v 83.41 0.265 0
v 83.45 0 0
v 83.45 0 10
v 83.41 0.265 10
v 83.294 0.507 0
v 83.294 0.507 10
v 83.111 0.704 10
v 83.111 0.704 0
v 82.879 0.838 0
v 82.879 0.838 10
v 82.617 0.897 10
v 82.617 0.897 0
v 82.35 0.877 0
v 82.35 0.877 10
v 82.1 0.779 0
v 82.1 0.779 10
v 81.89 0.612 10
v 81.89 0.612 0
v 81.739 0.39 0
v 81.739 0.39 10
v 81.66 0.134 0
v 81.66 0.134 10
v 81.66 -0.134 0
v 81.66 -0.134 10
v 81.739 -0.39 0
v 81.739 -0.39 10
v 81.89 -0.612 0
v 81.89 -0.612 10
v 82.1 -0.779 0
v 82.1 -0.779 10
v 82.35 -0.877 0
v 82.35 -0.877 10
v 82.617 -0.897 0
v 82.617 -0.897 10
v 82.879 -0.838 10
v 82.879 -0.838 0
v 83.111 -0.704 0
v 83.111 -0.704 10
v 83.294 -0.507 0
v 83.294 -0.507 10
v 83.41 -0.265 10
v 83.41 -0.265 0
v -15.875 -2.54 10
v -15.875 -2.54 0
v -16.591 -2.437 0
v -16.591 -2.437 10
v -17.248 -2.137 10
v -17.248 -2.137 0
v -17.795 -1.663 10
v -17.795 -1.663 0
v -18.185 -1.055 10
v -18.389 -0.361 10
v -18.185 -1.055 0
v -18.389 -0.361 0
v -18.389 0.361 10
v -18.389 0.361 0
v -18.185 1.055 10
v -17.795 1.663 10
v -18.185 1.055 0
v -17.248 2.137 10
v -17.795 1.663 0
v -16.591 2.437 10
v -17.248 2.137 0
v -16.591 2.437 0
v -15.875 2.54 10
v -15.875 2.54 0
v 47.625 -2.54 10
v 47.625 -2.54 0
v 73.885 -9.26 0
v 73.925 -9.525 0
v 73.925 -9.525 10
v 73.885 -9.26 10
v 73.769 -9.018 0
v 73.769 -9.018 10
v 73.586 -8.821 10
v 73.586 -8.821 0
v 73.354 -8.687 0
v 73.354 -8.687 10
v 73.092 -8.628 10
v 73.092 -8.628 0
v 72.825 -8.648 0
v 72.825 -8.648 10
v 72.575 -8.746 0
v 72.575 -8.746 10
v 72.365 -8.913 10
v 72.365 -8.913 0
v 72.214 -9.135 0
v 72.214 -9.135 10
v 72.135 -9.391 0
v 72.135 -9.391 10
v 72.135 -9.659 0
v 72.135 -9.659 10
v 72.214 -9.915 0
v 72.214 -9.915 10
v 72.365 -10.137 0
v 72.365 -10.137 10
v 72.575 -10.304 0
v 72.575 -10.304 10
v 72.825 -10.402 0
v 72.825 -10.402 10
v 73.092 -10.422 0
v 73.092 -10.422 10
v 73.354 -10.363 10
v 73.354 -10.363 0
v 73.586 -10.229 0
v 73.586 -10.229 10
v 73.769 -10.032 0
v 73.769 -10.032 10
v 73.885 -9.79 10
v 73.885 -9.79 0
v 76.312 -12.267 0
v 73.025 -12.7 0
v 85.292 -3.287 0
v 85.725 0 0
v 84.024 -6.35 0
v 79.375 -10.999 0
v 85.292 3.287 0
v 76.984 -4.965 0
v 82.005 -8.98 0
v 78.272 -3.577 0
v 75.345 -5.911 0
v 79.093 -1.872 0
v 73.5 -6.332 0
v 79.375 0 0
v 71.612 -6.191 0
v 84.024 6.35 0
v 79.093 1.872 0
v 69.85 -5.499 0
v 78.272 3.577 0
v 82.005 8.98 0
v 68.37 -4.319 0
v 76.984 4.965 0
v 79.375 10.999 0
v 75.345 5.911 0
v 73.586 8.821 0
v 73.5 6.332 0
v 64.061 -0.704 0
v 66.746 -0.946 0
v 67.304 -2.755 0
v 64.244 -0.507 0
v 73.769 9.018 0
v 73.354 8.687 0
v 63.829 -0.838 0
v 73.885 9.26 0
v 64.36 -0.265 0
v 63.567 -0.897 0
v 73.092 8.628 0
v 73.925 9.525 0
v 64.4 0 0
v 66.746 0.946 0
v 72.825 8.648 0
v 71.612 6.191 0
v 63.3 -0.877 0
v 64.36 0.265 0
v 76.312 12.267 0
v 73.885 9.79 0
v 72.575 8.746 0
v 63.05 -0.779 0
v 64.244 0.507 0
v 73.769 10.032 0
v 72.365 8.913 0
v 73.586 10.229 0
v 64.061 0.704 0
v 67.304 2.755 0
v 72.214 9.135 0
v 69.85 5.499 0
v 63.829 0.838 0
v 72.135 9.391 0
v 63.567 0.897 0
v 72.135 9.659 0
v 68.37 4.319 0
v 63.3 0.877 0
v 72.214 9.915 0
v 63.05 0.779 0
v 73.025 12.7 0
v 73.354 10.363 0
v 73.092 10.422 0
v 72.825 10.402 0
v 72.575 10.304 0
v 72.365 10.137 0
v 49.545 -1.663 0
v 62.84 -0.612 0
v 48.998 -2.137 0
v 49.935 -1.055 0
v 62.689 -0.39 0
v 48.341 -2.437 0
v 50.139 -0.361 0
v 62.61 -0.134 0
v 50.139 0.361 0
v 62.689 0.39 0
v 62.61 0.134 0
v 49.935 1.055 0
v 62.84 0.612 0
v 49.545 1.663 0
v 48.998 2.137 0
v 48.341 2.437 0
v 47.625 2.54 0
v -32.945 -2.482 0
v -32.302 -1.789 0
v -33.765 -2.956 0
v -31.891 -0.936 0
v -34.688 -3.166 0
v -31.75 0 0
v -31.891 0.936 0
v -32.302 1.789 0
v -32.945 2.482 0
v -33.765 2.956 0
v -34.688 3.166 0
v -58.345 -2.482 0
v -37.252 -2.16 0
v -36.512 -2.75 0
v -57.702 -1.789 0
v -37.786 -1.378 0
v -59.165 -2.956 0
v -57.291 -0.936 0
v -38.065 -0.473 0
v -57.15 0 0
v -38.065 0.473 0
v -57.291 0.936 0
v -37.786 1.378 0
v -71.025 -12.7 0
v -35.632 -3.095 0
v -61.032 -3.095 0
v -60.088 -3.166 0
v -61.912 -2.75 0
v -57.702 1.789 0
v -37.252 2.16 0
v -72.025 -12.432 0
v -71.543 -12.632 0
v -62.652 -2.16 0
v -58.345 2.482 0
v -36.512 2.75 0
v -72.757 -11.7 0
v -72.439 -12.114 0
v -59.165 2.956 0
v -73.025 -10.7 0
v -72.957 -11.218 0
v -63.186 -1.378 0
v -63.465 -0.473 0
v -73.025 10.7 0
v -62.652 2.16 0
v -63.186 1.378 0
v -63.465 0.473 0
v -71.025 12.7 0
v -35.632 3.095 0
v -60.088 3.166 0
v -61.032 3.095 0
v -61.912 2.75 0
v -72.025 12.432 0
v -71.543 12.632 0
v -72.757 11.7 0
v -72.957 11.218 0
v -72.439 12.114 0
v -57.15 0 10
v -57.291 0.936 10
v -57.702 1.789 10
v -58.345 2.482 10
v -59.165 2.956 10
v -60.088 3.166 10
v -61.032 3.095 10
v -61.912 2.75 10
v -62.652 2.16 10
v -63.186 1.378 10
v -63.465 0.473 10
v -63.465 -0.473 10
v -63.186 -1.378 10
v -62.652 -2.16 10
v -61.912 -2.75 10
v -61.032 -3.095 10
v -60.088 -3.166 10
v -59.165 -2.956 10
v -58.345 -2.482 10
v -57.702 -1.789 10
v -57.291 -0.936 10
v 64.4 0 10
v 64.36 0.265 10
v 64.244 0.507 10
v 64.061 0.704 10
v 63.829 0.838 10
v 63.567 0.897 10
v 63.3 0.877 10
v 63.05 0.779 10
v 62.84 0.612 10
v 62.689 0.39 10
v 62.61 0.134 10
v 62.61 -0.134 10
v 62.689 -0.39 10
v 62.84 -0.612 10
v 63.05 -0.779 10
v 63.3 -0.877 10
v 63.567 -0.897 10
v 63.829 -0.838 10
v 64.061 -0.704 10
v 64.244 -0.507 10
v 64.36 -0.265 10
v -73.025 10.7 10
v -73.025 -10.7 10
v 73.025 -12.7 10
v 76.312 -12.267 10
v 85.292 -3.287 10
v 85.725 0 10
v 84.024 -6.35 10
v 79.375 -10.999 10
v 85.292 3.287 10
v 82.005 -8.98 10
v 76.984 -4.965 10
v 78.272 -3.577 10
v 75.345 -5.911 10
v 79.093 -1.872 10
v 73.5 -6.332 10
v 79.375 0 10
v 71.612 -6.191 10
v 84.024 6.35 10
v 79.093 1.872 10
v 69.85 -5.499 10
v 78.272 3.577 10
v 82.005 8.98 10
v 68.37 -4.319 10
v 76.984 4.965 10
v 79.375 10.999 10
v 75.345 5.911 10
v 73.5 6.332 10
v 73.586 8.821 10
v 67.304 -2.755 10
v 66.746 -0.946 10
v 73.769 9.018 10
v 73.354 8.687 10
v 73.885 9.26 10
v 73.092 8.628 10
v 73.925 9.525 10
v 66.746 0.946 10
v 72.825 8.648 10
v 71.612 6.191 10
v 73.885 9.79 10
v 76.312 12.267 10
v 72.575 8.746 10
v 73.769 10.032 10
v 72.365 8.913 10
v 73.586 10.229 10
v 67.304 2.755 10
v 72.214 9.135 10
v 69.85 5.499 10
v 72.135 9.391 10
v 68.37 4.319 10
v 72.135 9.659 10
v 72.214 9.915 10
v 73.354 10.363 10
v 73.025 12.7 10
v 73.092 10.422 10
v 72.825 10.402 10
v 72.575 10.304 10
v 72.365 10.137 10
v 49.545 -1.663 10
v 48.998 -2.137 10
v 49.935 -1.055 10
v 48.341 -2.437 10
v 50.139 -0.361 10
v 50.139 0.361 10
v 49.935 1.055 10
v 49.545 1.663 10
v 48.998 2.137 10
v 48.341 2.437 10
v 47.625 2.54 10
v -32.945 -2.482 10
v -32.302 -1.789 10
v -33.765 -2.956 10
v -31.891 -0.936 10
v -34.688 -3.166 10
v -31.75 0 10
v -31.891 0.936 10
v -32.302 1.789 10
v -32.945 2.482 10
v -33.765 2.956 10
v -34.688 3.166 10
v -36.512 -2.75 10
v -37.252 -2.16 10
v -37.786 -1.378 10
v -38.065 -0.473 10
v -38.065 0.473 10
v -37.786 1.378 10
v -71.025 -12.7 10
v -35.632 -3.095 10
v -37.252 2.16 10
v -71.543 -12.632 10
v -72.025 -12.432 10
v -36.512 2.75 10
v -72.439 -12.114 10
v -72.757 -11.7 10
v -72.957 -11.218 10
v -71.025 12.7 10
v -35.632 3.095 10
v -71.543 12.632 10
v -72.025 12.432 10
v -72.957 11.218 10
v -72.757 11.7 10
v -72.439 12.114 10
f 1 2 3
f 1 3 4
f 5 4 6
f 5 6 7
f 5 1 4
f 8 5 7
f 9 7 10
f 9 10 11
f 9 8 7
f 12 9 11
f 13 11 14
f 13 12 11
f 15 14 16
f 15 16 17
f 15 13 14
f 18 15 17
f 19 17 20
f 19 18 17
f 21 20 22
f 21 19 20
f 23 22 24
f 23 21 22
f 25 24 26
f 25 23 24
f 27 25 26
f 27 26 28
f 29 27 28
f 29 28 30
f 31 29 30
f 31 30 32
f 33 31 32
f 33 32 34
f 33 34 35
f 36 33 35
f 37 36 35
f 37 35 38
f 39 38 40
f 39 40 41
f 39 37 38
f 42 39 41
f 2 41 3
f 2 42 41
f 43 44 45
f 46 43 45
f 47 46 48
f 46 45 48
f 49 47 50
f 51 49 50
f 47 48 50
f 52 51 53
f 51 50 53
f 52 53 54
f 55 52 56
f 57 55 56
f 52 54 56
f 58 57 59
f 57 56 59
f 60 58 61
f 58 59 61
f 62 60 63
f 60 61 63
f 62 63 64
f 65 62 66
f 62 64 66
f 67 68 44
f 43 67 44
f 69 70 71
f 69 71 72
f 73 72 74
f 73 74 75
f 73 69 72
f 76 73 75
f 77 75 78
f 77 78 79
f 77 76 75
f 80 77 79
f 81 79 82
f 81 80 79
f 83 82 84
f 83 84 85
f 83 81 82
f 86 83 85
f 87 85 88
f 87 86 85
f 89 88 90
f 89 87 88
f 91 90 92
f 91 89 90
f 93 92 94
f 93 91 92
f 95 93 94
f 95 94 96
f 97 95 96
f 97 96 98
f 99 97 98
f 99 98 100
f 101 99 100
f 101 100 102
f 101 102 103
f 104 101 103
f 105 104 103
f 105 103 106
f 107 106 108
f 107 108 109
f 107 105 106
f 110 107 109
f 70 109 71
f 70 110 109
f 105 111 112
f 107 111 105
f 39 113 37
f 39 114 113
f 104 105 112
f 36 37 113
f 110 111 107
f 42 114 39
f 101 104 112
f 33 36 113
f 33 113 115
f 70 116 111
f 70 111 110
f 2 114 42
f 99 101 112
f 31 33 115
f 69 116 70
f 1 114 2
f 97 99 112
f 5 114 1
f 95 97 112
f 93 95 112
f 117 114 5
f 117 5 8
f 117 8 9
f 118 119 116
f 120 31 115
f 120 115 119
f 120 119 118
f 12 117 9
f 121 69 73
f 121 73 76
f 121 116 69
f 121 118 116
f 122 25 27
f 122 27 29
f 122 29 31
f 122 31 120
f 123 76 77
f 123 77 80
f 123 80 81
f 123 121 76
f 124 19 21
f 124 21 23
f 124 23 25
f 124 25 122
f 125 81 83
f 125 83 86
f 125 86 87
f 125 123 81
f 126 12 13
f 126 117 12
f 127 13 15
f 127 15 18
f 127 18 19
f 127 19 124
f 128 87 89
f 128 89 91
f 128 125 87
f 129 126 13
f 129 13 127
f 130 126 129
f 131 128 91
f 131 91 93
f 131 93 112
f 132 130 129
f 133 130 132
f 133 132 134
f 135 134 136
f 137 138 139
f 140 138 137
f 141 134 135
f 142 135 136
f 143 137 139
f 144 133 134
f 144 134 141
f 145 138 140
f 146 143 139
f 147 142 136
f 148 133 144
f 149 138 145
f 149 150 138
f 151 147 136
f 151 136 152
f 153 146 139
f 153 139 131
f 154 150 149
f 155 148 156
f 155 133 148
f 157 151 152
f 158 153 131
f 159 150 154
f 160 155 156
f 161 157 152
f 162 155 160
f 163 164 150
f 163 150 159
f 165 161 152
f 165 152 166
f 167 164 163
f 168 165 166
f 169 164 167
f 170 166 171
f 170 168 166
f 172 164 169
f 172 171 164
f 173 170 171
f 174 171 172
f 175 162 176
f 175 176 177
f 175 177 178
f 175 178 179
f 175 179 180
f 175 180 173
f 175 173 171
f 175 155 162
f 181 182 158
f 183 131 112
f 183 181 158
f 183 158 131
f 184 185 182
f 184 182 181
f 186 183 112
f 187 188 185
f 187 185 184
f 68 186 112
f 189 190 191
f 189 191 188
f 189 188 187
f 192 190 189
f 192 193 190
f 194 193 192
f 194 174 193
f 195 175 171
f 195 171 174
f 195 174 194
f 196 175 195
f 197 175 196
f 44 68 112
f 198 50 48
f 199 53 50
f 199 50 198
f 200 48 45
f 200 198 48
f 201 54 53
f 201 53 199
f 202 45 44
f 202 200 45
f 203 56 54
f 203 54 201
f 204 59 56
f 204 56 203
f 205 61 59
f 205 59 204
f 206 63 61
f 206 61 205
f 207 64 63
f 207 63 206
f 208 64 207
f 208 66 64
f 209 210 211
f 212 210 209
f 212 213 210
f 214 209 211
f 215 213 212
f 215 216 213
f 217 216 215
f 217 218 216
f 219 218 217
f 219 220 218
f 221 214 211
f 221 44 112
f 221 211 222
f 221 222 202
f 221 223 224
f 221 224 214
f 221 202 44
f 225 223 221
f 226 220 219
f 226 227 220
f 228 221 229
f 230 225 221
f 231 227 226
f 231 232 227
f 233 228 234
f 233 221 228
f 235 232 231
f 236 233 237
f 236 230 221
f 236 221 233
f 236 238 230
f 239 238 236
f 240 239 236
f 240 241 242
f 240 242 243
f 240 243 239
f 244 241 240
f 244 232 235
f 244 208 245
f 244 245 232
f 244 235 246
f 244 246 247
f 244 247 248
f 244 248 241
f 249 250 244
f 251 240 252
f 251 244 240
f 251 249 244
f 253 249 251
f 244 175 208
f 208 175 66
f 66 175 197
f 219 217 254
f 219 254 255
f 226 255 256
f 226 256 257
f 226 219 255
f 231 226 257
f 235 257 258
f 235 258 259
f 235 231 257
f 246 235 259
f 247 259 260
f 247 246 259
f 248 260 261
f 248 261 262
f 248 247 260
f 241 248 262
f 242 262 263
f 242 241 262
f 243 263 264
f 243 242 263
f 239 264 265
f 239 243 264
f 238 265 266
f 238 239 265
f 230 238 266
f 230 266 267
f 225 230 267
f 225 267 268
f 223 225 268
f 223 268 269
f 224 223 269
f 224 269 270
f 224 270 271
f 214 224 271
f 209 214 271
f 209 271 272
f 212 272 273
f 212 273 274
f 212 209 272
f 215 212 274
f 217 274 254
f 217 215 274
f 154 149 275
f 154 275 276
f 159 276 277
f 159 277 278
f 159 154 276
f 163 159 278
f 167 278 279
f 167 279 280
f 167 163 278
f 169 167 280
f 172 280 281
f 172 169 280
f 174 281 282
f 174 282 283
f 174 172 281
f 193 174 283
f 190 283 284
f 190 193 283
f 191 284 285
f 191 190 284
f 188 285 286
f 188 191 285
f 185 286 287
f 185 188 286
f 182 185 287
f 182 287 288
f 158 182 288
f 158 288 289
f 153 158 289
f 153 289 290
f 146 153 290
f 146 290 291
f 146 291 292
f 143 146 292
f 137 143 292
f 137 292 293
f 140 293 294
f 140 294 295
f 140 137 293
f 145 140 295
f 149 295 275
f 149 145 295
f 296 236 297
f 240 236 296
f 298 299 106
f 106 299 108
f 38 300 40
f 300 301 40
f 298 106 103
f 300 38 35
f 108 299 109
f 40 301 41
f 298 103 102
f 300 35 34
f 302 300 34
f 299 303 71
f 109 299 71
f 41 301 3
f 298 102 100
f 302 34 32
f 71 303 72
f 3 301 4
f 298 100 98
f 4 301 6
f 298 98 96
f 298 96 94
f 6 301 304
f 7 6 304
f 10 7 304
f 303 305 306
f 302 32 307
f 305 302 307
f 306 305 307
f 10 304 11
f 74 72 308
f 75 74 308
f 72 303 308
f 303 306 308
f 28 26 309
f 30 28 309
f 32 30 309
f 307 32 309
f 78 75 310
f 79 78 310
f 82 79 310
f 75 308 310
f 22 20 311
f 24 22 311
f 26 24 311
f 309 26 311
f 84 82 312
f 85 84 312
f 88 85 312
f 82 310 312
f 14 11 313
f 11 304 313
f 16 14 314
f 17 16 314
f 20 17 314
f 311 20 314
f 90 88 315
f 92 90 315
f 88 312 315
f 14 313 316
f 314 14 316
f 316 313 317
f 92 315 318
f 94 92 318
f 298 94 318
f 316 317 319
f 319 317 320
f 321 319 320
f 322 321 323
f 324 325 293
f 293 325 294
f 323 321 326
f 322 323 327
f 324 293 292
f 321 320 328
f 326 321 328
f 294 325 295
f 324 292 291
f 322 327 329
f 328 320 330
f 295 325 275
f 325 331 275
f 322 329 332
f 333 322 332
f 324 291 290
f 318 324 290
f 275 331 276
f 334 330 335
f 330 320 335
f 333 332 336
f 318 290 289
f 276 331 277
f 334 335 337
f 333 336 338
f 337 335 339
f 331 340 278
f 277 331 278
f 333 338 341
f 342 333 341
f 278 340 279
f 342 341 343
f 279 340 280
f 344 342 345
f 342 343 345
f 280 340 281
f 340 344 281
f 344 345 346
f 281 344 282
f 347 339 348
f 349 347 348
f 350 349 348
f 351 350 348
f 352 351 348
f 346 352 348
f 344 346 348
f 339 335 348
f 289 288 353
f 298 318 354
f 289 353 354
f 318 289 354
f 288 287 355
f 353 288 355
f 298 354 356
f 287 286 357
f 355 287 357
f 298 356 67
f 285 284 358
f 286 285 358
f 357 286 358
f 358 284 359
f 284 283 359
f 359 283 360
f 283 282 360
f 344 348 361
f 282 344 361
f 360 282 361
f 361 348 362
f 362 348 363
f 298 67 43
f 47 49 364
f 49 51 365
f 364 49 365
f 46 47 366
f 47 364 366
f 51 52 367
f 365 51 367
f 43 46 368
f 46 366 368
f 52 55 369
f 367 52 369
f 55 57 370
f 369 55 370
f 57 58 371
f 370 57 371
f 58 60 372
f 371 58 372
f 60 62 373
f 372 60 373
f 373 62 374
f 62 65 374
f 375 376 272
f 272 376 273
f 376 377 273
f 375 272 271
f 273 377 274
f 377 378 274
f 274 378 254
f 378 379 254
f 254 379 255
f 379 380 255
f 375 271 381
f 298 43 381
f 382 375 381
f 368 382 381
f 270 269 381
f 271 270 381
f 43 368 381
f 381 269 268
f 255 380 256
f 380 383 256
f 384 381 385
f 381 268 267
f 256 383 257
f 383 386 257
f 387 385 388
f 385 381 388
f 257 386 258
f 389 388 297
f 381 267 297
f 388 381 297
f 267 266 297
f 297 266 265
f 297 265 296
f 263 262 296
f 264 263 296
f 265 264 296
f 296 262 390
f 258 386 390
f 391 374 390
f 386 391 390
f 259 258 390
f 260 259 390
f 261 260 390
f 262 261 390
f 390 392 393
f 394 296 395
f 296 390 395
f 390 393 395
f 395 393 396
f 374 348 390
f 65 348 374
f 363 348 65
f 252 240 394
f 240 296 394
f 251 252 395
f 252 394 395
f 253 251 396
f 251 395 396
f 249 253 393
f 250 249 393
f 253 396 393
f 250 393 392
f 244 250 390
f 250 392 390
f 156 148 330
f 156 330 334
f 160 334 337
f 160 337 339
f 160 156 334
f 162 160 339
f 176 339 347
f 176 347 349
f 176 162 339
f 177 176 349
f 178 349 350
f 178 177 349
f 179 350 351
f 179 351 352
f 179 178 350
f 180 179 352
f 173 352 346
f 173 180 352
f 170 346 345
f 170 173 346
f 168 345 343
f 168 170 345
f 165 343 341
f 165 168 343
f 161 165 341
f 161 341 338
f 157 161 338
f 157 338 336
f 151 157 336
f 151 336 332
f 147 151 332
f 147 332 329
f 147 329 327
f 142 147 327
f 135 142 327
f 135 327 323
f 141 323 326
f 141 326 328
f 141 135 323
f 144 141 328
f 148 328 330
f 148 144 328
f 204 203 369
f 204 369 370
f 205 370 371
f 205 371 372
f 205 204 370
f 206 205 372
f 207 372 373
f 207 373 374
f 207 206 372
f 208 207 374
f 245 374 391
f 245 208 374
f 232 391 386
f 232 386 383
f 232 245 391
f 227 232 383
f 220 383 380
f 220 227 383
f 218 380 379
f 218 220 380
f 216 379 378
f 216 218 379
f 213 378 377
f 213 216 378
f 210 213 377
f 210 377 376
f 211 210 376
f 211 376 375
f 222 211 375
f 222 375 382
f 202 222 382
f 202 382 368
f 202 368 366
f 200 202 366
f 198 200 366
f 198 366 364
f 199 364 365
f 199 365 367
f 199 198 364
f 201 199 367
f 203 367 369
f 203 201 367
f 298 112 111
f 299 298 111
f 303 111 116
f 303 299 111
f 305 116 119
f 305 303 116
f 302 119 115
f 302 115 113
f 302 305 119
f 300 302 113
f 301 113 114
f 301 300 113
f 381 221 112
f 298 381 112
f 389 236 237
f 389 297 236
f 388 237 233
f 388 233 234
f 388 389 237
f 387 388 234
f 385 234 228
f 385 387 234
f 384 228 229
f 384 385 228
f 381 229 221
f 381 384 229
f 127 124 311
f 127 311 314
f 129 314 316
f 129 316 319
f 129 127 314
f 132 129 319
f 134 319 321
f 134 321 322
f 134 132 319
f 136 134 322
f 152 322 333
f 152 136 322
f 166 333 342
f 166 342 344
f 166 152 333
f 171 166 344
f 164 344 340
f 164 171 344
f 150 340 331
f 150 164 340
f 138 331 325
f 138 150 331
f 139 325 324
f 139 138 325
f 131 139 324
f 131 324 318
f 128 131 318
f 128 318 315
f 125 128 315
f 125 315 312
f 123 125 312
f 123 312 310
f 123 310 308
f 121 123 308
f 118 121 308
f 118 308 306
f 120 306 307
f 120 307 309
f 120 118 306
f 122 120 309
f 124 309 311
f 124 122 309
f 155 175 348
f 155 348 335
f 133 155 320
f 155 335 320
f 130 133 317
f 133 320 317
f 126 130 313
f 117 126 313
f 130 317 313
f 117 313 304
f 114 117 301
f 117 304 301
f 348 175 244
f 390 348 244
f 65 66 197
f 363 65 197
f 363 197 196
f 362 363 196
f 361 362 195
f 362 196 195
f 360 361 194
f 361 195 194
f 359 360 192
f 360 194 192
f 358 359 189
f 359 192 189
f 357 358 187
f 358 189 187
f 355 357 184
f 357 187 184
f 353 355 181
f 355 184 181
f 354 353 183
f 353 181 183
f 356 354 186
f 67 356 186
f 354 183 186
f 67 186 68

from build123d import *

# Parameters (mm, degrees)
SKETCH1_R           = 3.175
SKETCH1_R_2         = 6.35
SKETCH1_R_3         = 0.9
BOSS_EXTRUDE1_DEPTH = 10
FILLET2_R           = 2
FILLET3_R           = 12.7


with BuildPart() as part:
    # Sketch1 → Boss-Extrude1 (new body)
    with BuildSketch(Plane.XY):
        Polygon((-73.025, -12.7), (-73.025, 12.7), (73.025, 12.7), (85.725, 12.7), (85.725, -12.7), (73.025, -12.7), align=None)
        with Locations((-60.325, 0)):
            Circle(SKETCH1_R, mode=Mode.SUBTRACT)
        with Locations((73.025, 0)):
            Circle(SKETCH1_R_2, mode=Mode.SUBTRACT)
        with Locations((73.025, 9.525)):
            Circle(SKETCH1_R_3, mode=Mode.SUBTRACT)
        with Locations((73.025, -9.525)):
            Circle(SKETCH1_R_3, mode=Mode.SUBTRACT)
        with Locations((63.5, 0)):
            Circle(SKETCH1_R_3, mode=Mode.SUBTRACT)
        with Locations((82.55, 0)):
            Circle(SKETCH1_R_3, mode=Mode.SUBTRACT)
        with Locations((-34.925, 0)):
            Circle(SKETCH1_R, mode=Mode.SUBTRACT)
        with BuildLine():
            Line((-15.875, 2.54), (47.625, 2.54))
            ThreePointArc((47.625, 2.54), (50.165, 0), (47.625, -2.54))
            Line((47.625, -2.54), (-15.875, -2.54))
            ThreePointArc((-15.875, -2.54), (-18.415, 0), (-15.875, 2.54))
        make_face(mode=Mode.SUBTRACT)
    extrude(amount=BOSS_EXTRUDE1_DEPTH)

    # Fillet2
    fillet2_edges = [part.edges().sort_by_distance(p)[0] for p in [
        (-73.025, -12.7, 5),
        (-73.025, 12.7, 5),
    ]]
    fillet(fillet2_edges, radius=FILLET2_R)

    # Fillet3
    fillet3_edges = [part.edges().sort_by_distance(p)[0] for p in [
        (85.725, 12.7, 5),
        (85.725, -12.7, 5),
    ]]
    fillet(fillet3_edges, radius=FILLET3_R - 0.0001)  # a hair under: the kernel refuses the full size


solid = part.part
